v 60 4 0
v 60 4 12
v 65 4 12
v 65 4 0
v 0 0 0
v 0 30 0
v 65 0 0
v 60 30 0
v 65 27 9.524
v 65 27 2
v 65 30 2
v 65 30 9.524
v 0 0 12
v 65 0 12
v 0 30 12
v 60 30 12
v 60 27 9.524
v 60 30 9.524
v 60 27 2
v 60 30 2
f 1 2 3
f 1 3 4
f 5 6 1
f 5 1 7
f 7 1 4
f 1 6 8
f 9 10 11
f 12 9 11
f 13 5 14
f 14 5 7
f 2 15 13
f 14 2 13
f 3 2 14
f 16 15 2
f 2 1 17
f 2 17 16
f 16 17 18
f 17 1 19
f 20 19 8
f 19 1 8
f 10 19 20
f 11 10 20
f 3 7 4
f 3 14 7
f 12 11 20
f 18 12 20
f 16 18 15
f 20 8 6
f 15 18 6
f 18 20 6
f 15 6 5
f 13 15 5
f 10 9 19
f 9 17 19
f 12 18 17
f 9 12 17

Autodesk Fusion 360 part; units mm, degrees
sketch "Sketch1" plane through (0, 0, 0) normal (0, 0, 1) x (1, 0, 0)
  line L0 (0, 0) -> (60, 0)
  line L1 (60, 0) -> (60, 30)
  line L2 (60, 30) -> (0, 30)
  line L3 (0, 30) -> (0, 0)
  dimension "d1" = 30
  dimension "d2" = 60
extrude "Extrude1" add sketch "Sketch1" along normal blind 12
sketch "Sketch2" plane through (60, 0, 0) normal (1, 0, 0) x (0, 1, 0)
  line L0 (0, 0) -> (30, 0)
  line L1 (30, 0) -> (30, 12)
  line L2 (30, 12) -> (0, 12)
  line L3 (0, 12) -> (0, 0)
  line L4 (0, 12) -> (4, 12)
  line L5 (4, 12) -> (4, 0)
  line L6 (4, 0) -> (0, 0)
  line L7 (0, 0) -> (0, 12)
  line L8 (30, 9.5242) -> (27, 9.5242)
  line L9 (27, 9.5242) -> (27, 2)
  line L10 (27, 2) -> (30, 2)
  line L11 (30, 2) -> (30, 9.5242)
extrude "Extrude2" add sketch "Sketch2" along normal blind 5 contours L0 L2 L3 L4 L5 L6 L7 | L1 L8 L9 L10 L11
